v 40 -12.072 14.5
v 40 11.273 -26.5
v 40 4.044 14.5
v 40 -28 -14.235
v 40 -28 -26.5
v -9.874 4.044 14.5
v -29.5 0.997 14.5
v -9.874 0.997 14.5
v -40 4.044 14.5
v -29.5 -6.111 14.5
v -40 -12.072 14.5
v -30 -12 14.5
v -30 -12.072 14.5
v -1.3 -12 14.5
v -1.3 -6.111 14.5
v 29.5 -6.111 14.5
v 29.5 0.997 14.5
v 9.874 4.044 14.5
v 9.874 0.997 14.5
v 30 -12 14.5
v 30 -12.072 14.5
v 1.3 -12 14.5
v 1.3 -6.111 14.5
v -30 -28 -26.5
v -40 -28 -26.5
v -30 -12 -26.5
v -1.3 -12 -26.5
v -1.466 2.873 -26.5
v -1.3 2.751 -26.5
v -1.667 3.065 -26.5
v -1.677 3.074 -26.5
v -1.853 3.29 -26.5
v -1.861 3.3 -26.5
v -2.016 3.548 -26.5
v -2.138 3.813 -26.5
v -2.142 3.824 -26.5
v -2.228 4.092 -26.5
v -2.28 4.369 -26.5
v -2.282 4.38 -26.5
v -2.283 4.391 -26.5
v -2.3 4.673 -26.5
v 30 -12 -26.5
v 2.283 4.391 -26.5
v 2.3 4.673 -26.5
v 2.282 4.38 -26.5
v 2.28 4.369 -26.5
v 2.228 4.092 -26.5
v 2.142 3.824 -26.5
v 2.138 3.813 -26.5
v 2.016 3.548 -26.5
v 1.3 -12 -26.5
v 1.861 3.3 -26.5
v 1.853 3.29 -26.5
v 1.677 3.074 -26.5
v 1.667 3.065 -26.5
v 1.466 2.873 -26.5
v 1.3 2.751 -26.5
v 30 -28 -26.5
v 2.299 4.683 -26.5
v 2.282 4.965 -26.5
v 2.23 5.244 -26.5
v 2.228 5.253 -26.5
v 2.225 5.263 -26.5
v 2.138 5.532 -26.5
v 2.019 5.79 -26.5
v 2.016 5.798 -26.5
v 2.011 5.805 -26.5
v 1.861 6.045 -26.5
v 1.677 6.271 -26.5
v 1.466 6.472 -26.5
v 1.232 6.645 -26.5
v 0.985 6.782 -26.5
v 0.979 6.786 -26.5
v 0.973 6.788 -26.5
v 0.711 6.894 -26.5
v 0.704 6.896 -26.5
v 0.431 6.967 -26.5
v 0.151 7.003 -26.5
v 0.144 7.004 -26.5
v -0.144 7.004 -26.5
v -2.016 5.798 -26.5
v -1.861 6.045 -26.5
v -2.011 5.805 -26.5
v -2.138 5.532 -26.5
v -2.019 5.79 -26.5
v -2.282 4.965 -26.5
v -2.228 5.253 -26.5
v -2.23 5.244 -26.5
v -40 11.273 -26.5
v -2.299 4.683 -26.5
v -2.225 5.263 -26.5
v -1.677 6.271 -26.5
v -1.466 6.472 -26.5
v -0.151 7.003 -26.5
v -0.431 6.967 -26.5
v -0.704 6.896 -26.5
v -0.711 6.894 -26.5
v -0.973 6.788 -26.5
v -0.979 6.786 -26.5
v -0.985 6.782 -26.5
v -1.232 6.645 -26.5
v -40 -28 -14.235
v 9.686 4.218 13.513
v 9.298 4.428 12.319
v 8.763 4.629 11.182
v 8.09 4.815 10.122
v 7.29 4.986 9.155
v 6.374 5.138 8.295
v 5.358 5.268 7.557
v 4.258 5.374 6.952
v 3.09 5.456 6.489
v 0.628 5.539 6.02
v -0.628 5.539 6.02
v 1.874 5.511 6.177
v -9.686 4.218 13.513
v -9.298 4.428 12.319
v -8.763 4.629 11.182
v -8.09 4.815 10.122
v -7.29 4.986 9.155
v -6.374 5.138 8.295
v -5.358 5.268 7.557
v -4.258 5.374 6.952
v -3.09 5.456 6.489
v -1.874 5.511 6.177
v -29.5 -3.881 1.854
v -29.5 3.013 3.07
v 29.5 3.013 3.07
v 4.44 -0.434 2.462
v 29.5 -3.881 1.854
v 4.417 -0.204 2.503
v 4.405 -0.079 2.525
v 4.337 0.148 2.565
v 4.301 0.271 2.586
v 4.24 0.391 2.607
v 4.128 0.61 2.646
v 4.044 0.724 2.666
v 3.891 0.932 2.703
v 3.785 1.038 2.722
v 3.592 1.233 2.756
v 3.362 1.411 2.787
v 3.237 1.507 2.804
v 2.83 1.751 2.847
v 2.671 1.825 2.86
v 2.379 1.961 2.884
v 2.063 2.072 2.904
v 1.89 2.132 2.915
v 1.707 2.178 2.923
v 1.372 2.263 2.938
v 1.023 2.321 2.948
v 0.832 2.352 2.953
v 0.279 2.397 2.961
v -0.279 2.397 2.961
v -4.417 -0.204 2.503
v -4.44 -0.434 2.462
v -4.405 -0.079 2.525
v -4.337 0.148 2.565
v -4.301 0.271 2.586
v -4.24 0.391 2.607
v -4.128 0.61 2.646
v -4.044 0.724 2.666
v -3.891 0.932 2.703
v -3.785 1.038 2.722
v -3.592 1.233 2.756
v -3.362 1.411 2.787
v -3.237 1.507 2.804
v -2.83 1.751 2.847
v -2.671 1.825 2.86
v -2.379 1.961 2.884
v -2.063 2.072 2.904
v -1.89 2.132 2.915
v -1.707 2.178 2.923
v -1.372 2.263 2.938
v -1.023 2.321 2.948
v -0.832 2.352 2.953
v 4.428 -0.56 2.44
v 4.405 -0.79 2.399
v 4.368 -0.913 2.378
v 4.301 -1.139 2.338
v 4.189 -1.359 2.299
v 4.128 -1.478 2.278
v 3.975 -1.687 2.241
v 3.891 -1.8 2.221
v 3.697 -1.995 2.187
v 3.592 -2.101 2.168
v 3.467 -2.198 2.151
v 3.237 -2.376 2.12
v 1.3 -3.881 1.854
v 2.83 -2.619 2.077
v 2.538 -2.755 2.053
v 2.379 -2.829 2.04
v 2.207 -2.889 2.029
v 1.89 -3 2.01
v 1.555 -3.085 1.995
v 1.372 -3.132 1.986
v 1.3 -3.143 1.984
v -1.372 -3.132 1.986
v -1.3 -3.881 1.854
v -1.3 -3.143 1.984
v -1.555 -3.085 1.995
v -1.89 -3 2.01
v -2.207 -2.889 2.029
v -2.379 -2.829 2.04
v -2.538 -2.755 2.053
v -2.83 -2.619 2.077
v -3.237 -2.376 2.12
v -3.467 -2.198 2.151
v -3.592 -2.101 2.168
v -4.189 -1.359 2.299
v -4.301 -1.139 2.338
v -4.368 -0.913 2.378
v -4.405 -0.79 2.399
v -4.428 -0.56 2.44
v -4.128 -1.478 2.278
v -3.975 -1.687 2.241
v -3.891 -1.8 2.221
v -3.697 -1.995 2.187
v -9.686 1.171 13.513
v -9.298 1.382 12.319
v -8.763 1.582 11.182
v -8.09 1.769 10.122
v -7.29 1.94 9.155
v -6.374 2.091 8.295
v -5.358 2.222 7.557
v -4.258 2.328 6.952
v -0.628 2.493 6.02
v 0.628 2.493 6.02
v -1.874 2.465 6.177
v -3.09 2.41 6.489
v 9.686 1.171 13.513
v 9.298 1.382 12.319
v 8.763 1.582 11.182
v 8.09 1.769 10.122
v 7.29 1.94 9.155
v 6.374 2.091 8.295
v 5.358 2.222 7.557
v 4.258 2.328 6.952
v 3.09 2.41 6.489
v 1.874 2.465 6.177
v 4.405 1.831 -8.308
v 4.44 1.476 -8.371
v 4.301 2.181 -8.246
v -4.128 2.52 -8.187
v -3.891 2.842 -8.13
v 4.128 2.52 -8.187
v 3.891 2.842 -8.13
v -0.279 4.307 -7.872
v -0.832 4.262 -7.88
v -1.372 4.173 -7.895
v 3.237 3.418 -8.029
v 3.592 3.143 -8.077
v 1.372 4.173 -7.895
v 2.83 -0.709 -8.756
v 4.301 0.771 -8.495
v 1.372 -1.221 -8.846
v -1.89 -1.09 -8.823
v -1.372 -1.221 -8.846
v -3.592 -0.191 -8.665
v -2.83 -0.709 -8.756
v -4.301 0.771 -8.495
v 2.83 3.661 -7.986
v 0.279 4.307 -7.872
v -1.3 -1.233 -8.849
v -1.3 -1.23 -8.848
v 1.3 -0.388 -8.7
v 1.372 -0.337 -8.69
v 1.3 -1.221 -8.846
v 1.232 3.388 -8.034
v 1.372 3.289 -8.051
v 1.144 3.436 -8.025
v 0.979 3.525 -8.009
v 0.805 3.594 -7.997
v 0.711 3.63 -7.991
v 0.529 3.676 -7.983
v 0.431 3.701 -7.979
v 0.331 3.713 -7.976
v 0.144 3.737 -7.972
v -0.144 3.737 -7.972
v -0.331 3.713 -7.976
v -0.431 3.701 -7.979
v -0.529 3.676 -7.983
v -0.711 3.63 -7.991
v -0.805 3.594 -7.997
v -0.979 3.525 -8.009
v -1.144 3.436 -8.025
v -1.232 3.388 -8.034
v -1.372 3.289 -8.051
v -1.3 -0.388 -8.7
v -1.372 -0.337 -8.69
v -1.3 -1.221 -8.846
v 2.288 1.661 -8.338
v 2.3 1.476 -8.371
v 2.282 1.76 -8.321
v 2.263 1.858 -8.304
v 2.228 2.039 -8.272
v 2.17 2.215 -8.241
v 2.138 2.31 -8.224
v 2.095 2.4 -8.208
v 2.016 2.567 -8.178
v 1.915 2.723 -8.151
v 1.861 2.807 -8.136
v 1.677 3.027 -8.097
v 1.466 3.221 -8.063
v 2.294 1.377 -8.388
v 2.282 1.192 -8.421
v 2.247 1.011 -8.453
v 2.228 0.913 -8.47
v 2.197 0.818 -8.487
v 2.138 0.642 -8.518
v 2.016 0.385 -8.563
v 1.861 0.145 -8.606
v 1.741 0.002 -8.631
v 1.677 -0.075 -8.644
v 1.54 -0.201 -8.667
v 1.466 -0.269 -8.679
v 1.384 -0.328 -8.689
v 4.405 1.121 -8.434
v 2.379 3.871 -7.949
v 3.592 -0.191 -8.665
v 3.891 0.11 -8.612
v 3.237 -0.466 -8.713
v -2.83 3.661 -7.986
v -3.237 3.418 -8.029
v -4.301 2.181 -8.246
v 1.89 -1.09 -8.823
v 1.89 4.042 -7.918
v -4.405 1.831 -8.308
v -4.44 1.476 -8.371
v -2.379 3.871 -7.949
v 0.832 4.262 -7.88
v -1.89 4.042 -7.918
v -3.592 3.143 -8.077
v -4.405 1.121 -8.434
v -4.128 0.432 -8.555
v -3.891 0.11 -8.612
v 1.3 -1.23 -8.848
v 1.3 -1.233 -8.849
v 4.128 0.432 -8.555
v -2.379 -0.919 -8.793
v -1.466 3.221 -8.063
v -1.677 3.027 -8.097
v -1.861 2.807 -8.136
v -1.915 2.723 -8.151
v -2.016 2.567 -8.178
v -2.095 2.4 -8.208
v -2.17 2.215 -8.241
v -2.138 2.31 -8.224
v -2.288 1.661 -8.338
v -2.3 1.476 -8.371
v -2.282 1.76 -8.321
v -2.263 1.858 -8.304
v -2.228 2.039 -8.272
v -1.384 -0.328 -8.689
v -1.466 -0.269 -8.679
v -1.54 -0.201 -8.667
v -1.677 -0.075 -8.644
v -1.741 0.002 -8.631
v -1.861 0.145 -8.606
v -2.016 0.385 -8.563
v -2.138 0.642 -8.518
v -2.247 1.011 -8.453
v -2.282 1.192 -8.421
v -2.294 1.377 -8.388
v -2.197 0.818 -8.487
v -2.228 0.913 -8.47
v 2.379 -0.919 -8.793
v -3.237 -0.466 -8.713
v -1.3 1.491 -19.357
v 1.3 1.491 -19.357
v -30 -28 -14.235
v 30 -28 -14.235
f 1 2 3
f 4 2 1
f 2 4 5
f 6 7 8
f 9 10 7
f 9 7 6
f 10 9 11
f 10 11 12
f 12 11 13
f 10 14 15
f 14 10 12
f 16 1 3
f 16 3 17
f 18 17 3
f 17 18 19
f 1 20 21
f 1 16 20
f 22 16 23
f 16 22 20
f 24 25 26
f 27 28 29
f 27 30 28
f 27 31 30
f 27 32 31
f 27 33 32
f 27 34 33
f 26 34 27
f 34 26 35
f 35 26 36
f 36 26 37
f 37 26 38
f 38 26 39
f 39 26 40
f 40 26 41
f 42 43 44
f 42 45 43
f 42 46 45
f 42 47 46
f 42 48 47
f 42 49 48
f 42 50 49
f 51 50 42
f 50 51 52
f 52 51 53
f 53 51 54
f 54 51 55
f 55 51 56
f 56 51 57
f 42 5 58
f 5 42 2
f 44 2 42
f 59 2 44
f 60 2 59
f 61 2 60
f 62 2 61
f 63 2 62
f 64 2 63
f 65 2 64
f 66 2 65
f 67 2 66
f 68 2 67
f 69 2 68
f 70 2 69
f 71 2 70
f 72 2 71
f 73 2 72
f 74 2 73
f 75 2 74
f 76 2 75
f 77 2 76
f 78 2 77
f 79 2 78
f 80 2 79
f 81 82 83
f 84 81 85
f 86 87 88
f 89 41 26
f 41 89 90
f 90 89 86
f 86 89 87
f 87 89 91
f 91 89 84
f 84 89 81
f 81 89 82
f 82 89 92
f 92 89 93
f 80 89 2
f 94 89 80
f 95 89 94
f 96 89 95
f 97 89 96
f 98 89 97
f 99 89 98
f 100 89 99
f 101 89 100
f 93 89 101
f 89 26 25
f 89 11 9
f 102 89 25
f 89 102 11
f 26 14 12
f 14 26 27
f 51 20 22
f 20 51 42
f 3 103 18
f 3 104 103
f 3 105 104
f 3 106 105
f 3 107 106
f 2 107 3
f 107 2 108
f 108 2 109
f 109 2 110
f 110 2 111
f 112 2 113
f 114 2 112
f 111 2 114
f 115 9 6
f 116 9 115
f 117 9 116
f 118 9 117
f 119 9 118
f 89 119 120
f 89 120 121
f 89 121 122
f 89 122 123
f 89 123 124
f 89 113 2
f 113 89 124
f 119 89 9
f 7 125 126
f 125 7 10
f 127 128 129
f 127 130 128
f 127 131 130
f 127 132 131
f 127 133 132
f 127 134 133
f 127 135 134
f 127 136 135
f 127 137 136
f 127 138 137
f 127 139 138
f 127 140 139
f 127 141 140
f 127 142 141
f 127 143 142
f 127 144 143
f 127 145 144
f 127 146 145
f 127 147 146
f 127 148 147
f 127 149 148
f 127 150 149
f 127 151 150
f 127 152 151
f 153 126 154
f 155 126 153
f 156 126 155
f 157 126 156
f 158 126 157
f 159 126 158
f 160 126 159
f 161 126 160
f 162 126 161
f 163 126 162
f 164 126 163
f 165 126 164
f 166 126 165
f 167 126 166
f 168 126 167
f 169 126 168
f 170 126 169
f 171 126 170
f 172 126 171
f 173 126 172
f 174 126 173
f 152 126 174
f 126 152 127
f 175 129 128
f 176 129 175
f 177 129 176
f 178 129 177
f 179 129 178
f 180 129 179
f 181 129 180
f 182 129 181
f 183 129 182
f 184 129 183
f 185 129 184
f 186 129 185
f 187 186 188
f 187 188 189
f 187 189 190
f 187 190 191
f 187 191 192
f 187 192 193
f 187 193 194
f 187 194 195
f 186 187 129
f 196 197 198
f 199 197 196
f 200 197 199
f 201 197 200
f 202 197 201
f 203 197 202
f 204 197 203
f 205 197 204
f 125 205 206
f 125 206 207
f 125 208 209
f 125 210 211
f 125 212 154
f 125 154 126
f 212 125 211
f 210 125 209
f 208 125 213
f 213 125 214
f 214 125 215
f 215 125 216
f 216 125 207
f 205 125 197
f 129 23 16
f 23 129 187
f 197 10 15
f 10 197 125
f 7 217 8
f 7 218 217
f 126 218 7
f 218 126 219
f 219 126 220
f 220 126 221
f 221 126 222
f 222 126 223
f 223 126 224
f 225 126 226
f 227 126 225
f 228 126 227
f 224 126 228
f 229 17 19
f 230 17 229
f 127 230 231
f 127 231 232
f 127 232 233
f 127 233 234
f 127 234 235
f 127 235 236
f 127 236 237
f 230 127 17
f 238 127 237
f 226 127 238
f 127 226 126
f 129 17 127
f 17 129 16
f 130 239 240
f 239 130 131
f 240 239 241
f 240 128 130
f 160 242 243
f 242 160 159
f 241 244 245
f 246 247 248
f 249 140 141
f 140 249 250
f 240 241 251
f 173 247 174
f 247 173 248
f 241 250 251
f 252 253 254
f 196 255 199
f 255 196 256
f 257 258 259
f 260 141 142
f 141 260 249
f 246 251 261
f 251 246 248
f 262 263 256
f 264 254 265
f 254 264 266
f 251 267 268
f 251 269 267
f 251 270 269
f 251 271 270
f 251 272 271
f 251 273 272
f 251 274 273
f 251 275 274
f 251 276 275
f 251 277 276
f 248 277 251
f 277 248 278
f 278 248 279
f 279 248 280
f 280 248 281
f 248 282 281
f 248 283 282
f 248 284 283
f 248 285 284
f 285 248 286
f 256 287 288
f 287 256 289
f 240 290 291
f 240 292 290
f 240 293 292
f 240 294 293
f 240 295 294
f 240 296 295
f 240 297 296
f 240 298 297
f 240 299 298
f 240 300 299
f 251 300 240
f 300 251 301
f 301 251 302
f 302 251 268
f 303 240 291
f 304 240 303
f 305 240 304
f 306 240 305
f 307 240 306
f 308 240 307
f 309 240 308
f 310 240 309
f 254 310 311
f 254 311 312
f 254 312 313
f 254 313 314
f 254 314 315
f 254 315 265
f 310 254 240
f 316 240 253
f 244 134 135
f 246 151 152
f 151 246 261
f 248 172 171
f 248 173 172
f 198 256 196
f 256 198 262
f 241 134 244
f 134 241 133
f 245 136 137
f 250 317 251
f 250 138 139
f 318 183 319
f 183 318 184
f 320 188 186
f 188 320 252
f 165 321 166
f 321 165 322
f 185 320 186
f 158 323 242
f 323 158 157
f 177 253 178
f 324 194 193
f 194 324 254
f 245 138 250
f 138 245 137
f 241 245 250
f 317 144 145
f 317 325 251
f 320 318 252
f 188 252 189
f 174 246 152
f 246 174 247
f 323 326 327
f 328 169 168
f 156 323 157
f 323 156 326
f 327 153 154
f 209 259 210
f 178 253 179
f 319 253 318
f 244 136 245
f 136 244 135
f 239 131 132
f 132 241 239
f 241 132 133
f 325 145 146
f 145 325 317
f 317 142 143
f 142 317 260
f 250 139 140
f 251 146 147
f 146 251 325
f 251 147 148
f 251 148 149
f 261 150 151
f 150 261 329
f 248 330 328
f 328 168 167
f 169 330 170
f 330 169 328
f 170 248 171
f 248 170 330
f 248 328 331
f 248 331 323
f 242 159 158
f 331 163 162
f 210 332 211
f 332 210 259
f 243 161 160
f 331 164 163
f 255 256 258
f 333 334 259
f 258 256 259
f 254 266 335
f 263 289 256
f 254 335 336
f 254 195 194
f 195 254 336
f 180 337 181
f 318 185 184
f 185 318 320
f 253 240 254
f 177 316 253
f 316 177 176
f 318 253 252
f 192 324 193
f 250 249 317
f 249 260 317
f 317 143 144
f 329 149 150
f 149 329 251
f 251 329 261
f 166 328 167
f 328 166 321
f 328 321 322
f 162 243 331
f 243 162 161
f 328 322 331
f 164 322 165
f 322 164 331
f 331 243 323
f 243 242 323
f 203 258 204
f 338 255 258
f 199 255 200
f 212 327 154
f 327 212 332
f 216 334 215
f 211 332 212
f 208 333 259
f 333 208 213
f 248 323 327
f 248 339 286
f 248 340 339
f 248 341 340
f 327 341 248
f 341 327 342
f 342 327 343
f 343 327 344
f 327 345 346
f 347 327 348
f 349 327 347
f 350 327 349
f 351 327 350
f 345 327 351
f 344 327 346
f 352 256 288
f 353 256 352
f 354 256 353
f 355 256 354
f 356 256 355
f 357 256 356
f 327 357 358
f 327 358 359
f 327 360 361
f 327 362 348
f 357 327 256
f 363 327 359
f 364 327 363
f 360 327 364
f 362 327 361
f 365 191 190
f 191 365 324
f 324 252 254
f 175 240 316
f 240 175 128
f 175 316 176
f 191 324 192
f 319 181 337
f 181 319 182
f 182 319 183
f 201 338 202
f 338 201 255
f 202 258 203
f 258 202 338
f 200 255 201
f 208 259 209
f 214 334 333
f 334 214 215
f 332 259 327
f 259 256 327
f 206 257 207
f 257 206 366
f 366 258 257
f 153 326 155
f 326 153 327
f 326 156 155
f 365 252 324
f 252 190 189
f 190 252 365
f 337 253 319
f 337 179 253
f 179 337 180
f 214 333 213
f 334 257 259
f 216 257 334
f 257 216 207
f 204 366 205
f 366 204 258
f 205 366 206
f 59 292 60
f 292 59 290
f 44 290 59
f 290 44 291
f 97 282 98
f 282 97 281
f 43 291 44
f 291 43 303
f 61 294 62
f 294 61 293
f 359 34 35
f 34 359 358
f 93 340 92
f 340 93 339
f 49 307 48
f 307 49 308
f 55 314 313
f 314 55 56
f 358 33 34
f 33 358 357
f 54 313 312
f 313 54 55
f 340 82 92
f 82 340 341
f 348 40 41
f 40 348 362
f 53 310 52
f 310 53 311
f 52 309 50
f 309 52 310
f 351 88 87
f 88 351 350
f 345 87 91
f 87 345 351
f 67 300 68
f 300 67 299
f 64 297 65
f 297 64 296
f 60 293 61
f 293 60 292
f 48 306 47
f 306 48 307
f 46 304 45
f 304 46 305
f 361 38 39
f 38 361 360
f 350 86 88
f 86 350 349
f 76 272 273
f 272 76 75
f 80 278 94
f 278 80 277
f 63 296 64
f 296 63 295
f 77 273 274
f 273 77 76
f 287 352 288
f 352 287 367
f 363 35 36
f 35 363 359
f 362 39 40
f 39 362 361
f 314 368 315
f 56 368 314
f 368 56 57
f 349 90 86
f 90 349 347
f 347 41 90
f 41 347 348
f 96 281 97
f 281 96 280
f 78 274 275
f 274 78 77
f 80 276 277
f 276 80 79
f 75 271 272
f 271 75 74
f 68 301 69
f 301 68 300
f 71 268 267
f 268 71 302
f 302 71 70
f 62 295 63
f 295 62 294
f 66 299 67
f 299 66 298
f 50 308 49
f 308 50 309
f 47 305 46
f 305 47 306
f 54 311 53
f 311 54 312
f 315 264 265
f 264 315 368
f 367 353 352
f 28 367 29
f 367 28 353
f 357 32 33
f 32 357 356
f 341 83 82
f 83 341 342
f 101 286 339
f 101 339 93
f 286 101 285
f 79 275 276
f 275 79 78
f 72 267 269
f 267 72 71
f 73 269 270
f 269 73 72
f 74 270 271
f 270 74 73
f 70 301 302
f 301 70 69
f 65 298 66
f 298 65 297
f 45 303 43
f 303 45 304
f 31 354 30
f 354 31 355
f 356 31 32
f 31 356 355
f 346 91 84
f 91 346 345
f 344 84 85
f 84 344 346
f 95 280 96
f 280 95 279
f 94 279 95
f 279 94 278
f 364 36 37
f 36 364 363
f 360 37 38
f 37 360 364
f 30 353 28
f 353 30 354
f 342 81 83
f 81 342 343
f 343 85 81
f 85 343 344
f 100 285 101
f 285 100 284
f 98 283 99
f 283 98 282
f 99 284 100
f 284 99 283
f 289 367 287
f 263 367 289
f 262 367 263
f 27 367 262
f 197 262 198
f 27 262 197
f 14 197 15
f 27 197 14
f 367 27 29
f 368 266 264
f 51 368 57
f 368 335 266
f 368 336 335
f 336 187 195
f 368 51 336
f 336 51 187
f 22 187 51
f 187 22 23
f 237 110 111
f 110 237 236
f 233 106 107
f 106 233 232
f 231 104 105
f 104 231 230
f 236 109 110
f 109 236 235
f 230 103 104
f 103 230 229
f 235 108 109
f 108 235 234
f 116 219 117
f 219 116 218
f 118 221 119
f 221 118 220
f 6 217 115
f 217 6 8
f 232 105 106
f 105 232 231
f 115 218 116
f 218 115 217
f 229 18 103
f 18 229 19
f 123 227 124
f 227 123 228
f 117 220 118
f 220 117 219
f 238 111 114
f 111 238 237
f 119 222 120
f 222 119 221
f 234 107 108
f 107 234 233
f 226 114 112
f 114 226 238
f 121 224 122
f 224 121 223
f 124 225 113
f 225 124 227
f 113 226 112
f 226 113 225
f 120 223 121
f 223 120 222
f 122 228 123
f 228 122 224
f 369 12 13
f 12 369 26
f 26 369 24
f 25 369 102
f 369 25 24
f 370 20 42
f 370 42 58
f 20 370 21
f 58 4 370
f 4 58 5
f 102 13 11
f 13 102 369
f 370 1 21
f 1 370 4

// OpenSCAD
difference(){
	translate([0,0,-6]) cube(size = [80,24,41], center = true);
	rotate([10,0,0]) translate([0,11,-5]) color("blue") cube(size = [81,9,50], center = true);
	rotate([10,0,0]) translate([0,0,9]) color("green") cube(size = [59,7,13], center = true);
	rotate([10,0,0]) scale([1.85,1.2,1])  cylinder(h = 17	, r=2.4,$fn=50, center=true);	
	rotate([10,0,0]) translate([0,0,-13]) cylinder(h = 30, r=2.3,$fn=50, center=true);	
	rotate([10,0,0]) translate([0,-9.5,-5]) color("red") cube(size = [2.6,17,49], center=true);
	translate([0,8,16]) rotate([90,0,0]) cylinder(h = 15, r=10,$fn=50, center=true);	

}

difference(){
	union(){
		translate([-35,-20,-6]) cube(size = [10,16,41], center = true);	
		translate([35,-20,-6]) cube(size = [10,16,41], center = true);
	}
	translate([0,-26,10]) rotate([61,0,0]) cube(size = [81,45,20], center = true);
}
